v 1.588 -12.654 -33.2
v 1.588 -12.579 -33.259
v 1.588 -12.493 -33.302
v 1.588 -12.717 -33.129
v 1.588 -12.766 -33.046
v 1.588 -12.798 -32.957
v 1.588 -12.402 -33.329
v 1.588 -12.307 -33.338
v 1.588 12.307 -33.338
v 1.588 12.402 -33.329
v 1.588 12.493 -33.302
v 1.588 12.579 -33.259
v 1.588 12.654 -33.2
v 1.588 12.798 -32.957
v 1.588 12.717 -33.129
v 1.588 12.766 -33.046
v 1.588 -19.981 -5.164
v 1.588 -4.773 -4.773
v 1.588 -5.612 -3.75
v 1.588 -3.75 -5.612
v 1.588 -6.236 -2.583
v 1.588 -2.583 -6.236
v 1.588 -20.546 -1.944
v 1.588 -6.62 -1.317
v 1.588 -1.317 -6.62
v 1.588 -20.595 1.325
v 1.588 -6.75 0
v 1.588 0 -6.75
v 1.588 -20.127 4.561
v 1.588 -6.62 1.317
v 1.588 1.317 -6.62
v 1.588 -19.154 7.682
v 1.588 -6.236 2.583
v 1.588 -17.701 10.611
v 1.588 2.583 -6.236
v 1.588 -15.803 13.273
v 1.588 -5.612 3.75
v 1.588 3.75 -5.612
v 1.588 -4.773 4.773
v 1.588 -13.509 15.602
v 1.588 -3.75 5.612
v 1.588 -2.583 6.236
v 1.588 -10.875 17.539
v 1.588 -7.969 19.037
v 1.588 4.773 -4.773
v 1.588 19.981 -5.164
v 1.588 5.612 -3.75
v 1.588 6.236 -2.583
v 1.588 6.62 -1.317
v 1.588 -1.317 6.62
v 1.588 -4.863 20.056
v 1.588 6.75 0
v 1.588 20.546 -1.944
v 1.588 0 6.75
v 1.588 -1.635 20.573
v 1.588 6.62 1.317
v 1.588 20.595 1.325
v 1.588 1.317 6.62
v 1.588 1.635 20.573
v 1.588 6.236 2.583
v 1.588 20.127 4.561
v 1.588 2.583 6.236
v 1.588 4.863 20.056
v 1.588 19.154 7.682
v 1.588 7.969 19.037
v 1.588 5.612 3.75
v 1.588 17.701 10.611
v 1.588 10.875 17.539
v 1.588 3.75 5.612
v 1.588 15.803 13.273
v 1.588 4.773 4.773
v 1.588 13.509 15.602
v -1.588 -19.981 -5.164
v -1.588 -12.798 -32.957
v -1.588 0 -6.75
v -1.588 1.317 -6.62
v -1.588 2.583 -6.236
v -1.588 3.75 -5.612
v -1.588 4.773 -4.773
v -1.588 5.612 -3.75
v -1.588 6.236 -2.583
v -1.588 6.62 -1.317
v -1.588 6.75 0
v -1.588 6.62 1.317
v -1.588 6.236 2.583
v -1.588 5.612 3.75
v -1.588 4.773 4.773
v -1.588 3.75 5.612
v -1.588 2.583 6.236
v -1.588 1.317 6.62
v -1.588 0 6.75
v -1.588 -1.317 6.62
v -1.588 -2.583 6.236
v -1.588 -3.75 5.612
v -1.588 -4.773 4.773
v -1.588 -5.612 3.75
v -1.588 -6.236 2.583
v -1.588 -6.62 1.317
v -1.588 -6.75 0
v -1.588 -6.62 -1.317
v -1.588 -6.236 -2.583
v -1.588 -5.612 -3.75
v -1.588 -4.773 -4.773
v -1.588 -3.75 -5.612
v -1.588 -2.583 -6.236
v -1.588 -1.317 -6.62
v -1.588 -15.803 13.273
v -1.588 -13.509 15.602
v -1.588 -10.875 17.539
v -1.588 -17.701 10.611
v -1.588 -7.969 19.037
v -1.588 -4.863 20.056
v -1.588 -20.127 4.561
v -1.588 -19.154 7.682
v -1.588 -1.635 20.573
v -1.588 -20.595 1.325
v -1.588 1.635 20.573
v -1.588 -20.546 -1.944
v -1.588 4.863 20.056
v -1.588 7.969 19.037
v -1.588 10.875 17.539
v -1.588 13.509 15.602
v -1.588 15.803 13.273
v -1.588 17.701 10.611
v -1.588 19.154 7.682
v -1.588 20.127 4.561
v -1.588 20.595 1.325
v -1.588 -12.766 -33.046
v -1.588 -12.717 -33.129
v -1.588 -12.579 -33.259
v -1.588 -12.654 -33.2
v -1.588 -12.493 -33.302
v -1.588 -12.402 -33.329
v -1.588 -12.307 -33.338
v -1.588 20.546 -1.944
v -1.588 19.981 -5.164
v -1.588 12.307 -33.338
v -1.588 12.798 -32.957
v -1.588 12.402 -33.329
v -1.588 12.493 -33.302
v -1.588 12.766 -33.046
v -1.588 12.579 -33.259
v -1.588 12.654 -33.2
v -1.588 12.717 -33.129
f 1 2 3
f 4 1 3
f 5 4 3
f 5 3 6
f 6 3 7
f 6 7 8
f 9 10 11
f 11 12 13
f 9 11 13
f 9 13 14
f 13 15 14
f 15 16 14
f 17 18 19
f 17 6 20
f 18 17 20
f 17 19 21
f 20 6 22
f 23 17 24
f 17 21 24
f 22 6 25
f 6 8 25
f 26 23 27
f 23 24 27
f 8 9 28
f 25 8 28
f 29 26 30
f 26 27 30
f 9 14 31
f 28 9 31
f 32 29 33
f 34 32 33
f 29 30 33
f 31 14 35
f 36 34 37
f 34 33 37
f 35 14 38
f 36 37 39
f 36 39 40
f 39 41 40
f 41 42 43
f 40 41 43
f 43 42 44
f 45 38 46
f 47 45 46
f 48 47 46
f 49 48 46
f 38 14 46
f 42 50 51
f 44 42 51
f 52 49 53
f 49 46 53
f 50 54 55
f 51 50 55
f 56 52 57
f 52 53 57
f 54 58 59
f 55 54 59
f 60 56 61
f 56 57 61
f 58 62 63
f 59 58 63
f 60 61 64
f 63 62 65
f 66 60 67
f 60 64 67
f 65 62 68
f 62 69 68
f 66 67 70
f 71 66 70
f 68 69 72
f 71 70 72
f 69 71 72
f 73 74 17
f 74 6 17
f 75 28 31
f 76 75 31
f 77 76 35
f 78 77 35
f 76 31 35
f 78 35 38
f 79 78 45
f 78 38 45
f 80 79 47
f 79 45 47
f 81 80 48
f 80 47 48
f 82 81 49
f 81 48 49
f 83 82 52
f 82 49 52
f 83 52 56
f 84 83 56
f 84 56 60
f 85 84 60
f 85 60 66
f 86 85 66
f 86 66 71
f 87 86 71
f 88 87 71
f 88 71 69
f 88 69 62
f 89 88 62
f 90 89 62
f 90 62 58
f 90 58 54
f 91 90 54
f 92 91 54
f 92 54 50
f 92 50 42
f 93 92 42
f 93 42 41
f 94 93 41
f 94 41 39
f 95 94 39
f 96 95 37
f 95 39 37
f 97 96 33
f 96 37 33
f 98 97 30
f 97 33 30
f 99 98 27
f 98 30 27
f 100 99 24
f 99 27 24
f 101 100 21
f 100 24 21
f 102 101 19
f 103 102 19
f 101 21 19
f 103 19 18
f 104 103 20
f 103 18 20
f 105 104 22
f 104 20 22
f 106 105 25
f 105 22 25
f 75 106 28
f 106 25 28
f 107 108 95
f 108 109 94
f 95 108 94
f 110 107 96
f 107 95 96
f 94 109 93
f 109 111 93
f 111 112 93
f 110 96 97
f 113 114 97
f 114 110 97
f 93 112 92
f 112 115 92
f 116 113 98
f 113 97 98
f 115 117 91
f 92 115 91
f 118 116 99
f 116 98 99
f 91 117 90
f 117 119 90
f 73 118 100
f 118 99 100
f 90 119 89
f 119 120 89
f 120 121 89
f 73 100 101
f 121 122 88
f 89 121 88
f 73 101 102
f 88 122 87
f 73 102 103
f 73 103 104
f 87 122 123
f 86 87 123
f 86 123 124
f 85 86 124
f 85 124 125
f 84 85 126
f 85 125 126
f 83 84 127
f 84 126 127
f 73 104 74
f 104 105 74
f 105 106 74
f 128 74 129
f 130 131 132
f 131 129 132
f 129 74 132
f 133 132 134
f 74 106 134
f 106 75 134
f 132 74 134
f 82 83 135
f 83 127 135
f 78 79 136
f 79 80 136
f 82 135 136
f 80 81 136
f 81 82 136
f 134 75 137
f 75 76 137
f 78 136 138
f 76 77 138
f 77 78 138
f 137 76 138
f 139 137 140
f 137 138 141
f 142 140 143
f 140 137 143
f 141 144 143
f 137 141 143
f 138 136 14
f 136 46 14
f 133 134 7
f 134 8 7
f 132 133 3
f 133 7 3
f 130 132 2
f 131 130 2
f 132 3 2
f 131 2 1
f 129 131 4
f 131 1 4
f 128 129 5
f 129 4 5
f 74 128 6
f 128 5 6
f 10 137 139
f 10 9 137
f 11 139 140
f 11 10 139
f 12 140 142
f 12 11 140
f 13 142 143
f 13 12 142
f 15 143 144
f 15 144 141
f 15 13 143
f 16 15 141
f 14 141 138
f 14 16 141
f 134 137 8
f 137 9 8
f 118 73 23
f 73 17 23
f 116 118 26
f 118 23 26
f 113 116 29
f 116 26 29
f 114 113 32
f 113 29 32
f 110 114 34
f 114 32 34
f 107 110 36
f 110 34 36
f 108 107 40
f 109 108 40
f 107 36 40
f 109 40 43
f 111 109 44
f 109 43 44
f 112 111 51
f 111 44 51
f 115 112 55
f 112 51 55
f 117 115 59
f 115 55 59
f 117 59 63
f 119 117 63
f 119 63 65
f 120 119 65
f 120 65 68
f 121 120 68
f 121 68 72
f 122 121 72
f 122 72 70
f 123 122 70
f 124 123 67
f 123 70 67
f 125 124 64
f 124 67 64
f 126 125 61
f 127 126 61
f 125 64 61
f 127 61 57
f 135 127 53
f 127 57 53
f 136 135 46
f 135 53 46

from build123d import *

# Parameters (mm, degrees)
SKETCH1_R             = 6.749999962
BOSS_EXTRUDE1_DEPTH   = 1.5875
FILLET1_R             = 0.508
FILLET2_R             = 0.508
M12_CLEARANCE_HOLE1_D = 13.5


with BuildPart() as part:
    # Sketch1 → Boss-Extrude1 (new, symmetric)
    # profile 1 of 2: a face of its own
    with BuildSketch(Plane(origin=(0, 0, 0), x_dir=(0, 0, -1), z_dir=(1, 0, 0))):
        with BuildLine():
            Line((33.3375, -12.7), (5.163771309, -19.981037814))
            ThreePointArc((5.163771309, -19.981037814), (-20.6375, 0), (5.163771309, 19.981037814))
            Line((5.163771309, 19.981037814), (33.3375, 12.7))
            Line((33.3375, 12.7), (33.3375, -12.7))
        make_face()
        Circle(SKETCH1_R, mode=Mode.SUBTRACT)
    # profile 2 of 2: a face of its own
    with BuildSketch(Plane(origin=(0, 0, 0), x_dir=(0, 0, -1), z_dir=(1, 0, 0))):
        Circle(SKETCH1_R)
    extrude(amount=BOSS_EXTRUDE1_DEPTH, both=True)

    # Fillet1
    fillet1_edges = [part.edges().sort_by_distance(p)[0] for p in [
        (0, -12.7, -33.3375),
    ]]
    fillet(fillet1_edges, radius=FILLET1_R)

    # Fillet2
    fillet2_edges = [part.edges().sort_by_distance(p)[0] for p in [
        (0, 12.7, -33.3375),
    ]]
    fillet(fillet2_edges, radius=FILLET2_R)

    # M12 Clearance Hole1 (through all)
    with Locations(Plane.ZY.offset(1.5875)):
        with Locations((0, 0)):
            Hole(M12_CLEARANCE_HOLE1_D / 2)


solid = part.part
